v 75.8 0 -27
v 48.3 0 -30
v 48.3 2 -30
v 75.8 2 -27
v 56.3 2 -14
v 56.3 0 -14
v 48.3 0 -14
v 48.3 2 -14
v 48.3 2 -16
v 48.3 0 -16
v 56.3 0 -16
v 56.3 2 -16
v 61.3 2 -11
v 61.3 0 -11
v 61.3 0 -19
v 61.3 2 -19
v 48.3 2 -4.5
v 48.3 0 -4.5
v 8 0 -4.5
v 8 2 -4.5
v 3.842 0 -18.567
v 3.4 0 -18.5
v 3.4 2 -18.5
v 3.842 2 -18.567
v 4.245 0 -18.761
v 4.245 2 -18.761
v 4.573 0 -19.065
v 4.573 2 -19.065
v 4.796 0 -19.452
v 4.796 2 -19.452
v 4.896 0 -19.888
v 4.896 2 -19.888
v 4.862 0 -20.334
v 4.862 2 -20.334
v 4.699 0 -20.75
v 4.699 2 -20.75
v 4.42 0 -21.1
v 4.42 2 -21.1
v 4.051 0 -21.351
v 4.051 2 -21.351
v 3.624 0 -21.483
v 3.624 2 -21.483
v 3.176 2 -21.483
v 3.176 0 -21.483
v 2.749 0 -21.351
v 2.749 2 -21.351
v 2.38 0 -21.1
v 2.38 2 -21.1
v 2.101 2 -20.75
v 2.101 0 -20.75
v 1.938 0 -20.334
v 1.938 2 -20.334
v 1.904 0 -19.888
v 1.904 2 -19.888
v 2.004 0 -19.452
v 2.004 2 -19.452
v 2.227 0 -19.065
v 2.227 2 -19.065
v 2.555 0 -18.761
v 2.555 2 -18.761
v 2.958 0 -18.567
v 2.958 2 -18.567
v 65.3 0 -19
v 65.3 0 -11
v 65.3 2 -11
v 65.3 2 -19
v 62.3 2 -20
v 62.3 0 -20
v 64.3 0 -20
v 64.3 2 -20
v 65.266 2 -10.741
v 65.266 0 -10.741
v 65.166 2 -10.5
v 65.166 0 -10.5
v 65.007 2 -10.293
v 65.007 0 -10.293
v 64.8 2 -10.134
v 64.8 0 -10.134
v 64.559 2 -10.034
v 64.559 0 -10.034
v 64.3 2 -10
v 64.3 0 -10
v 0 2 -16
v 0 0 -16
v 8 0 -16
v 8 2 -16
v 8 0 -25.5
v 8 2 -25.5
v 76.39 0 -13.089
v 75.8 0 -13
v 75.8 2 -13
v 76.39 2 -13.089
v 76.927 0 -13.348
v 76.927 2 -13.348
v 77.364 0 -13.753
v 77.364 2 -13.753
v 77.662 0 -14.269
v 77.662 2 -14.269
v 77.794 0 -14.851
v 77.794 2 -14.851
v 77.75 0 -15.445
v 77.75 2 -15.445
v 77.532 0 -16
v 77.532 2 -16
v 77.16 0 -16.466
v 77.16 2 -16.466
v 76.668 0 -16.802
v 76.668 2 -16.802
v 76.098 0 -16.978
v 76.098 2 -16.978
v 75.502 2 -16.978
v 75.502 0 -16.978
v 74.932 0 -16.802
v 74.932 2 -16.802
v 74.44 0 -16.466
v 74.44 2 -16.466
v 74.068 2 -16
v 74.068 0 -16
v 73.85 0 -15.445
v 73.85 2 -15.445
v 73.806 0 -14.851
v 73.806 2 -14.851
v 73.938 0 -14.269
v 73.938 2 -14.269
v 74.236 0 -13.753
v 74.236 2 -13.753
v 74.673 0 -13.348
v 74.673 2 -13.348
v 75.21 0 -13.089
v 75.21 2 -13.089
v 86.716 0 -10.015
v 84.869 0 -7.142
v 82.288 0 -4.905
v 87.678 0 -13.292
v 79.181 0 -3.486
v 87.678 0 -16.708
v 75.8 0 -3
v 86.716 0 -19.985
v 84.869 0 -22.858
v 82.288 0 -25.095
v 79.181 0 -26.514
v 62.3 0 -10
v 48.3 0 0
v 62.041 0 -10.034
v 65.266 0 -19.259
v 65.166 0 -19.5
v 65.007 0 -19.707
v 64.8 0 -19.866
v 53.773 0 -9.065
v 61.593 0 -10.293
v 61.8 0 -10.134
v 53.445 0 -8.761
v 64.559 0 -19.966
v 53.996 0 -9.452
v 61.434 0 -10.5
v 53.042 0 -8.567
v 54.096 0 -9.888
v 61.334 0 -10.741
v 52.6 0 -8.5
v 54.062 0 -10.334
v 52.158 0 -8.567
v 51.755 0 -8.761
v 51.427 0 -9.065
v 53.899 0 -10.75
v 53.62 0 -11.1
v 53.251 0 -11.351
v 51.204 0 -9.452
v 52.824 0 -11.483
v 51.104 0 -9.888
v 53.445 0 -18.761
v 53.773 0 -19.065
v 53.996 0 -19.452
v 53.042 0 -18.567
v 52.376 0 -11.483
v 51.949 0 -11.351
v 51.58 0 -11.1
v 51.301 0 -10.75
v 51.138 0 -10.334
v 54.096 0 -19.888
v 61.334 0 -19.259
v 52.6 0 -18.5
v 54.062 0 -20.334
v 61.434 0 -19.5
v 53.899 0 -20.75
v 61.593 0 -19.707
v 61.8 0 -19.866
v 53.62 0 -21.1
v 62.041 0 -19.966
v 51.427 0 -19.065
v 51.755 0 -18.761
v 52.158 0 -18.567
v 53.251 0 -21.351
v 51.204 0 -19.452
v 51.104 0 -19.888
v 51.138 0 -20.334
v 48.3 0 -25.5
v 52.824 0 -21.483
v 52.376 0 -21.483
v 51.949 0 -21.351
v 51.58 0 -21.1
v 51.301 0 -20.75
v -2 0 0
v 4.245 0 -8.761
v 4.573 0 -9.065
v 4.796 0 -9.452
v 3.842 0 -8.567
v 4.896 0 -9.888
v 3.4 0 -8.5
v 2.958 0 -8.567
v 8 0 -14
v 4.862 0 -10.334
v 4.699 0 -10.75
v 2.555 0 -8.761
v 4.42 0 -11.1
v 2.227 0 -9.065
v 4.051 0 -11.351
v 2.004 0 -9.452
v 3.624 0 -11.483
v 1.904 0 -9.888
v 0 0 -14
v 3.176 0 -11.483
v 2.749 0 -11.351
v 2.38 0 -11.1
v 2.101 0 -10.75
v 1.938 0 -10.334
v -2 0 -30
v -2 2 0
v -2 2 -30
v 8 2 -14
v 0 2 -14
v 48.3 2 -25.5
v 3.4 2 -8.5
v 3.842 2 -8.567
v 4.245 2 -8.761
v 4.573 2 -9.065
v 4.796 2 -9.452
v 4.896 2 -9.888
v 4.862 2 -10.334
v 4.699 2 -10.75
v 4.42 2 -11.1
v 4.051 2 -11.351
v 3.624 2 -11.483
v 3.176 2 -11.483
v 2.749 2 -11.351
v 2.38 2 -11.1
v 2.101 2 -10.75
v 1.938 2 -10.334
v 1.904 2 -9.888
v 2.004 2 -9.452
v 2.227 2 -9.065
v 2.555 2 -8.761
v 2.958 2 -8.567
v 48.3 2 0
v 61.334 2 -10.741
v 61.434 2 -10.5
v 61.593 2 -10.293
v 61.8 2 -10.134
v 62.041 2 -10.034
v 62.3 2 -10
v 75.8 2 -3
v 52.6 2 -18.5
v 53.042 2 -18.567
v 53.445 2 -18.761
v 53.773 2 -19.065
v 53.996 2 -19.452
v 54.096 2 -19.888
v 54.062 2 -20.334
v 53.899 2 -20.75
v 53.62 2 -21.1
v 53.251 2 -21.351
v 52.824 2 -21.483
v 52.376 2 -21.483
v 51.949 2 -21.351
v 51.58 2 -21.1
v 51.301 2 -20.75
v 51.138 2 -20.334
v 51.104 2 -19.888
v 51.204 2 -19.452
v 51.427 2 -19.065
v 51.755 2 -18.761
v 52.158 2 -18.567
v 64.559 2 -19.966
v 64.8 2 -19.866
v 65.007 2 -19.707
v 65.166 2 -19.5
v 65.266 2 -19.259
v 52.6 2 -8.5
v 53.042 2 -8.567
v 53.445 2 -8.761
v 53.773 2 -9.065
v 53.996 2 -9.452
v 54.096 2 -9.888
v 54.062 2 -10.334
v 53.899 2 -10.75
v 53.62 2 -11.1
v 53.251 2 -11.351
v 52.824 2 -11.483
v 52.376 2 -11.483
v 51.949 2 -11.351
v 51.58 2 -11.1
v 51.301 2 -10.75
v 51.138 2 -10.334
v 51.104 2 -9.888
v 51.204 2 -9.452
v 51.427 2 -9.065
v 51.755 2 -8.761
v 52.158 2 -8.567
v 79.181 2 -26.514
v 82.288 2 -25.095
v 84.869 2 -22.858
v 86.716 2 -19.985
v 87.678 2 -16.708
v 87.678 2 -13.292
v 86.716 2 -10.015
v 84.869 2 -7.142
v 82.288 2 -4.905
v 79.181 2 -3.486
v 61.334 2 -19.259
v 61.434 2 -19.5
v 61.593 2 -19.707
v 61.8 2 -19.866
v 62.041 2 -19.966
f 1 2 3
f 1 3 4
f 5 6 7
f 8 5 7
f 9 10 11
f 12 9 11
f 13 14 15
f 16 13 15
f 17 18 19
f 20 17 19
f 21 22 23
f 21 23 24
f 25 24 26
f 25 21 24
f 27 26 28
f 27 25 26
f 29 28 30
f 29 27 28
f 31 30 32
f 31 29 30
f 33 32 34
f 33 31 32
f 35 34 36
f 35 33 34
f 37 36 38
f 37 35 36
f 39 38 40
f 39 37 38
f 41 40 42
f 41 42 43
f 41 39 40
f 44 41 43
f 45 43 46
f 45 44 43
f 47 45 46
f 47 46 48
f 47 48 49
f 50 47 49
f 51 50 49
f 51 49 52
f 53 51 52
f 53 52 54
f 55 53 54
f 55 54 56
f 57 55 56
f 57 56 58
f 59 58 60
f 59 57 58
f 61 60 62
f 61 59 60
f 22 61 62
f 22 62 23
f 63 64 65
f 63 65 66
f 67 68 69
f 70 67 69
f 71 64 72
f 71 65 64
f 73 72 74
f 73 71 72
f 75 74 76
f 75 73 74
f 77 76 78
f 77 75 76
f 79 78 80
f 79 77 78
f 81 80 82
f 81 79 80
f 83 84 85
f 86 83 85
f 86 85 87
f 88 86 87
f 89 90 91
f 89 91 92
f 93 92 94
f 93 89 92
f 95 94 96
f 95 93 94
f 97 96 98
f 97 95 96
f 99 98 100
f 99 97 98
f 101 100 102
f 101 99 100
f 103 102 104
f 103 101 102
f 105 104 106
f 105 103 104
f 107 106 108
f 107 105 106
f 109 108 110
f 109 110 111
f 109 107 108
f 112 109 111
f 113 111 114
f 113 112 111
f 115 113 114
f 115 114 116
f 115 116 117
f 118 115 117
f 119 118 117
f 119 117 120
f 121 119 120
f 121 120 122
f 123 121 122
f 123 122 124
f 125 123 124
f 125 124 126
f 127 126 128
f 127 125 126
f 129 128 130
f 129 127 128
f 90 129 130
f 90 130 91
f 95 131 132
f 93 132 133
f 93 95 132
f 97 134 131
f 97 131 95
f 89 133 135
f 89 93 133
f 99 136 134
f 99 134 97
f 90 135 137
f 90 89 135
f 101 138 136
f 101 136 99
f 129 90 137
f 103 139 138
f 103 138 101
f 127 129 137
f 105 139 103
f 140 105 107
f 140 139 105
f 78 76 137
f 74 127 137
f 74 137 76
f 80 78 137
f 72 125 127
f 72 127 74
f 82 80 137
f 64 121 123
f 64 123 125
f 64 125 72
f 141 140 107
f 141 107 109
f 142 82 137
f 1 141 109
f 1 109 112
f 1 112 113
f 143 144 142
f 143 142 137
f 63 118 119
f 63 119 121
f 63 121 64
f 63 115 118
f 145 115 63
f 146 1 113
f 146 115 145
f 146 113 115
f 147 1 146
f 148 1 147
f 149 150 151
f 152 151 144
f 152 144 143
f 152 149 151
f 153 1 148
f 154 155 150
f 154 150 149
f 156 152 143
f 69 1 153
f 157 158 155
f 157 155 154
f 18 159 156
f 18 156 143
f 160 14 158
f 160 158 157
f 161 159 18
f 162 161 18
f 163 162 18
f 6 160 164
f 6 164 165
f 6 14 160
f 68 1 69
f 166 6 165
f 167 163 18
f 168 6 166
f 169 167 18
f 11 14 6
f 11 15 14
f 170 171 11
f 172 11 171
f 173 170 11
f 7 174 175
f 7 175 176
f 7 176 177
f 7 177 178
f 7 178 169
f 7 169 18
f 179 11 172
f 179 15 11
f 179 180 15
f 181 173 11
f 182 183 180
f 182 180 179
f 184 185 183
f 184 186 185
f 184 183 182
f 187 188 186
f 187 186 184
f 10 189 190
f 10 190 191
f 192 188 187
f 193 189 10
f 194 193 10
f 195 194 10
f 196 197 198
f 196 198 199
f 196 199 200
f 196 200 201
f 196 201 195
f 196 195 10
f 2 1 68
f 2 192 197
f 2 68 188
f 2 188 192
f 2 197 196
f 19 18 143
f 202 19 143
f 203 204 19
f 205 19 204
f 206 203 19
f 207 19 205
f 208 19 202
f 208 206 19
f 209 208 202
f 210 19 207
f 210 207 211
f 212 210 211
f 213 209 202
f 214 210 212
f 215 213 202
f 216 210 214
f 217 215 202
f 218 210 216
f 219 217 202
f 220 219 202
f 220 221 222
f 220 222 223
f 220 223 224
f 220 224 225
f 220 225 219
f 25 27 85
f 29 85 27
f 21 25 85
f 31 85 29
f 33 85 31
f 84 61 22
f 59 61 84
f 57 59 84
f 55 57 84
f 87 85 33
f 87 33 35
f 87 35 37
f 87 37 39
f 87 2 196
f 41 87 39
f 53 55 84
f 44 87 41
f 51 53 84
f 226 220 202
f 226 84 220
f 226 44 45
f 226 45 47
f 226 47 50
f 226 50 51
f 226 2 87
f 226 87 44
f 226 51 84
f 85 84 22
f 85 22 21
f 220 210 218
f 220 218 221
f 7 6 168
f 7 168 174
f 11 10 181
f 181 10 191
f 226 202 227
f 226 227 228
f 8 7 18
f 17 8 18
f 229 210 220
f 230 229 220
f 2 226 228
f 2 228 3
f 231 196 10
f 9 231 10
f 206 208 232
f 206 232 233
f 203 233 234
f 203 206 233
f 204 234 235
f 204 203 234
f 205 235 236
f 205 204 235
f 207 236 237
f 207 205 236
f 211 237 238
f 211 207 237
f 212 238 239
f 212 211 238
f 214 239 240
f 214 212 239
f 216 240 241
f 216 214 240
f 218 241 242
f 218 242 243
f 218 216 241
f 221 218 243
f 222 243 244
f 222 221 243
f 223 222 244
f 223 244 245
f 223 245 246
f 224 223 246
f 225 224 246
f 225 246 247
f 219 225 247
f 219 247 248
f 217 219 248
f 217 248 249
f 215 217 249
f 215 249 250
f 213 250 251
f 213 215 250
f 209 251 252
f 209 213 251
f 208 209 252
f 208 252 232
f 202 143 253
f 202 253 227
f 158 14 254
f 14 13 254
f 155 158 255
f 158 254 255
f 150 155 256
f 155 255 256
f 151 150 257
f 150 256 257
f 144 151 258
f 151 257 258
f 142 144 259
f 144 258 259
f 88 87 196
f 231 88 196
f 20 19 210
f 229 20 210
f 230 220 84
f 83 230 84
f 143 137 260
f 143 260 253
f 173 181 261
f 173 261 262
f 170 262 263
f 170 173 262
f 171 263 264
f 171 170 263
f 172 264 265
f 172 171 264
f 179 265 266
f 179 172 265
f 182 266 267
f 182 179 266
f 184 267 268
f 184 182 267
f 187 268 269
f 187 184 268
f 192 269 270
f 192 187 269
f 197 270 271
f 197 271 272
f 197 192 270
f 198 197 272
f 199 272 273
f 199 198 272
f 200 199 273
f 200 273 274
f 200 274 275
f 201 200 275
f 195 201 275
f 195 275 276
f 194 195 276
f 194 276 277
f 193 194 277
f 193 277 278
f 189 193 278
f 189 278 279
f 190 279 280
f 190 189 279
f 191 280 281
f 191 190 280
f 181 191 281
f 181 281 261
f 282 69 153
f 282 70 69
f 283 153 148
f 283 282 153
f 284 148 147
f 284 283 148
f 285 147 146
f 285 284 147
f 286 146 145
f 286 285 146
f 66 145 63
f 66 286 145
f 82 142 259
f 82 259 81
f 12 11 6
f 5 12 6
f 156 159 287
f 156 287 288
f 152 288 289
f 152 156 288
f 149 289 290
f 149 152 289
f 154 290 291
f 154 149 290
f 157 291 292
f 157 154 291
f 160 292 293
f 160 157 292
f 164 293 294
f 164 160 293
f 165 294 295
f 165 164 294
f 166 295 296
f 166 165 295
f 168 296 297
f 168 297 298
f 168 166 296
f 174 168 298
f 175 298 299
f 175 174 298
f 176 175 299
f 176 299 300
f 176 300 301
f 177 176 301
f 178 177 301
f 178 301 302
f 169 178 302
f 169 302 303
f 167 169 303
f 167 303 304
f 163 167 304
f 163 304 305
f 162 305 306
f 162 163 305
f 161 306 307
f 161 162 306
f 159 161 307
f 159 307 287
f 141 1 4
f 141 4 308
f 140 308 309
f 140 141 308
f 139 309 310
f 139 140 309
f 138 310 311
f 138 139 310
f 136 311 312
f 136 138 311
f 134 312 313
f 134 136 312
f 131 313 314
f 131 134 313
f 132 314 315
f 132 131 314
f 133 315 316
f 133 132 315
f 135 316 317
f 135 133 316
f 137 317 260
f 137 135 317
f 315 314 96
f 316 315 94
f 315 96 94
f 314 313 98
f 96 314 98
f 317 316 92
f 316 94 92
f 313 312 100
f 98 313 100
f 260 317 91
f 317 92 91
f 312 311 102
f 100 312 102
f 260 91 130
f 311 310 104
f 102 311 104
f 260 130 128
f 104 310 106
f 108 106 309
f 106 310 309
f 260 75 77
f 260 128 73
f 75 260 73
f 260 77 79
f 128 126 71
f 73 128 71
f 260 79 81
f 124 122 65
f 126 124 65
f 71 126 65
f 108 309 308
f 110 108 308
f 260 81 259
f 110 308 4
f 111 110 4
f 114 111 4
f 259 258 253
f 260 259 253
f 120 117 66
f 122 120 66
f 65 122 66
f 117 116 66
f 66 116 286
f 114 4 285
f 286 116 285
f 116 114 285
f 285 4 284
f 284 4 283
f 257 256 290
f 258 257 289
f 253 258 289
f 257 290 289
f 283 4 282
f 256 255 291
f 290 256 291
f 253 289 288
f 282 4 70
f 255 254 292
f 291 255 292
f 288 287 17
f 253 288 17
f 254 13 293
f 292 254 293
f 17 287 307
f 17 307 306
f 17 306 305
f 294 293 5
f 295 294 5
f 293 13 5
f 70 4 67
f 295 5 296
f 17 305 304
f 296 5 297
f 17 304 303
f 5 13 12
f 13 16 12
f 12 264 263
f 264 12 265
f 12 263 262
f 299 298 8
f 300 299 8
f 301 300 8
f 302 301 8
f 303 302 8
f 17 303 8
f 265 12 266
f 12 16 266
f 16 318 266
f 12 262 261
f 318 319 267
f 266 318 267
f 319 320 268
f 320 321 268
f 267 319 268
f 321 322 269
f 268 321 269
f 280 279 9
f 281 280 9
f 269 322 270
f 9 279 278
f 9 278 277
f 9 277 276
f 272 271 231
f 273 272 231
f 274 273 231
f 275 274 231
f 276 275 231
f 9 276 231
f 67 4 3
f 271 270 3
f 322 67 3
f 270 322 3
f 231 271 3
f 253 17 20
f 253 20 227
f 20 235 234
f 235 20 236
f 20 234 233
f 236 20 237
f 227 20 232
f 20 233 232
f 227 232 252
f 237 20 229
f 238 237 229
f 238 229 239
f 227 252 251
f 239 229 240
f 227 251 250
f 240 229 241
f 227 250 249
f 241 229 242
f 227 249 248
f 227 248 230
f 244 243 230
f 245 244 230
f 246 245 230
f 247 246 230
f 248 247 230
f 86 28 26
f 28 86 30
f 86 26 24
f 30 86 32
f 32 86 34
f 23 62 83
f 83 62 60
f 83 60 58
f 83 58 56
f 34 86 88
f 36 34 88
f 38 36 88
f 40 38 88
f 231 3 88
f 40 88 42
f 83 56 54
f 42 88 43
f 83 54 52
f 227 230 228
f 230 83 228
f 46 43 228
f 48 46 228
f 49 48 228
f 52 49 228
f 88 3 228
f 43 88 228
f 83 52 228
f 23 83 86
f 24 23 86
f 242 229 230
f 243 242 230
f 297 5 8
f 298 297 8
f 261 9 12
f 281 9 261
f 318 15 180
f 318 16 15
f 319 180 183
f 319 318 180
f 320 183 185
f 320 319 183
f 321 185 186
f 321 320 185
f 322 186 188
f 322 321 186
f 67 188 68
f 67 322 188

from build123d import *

# Parameters (mm, degrees)
SKETCH_1_R      = 1.5
SKETCH_1_R_2    = 2
SKETCH_1_W      = 4
SKETCH_1_H      = 10
EXTRUDE_1_DEPTH = 2
FILLET_1_R      = 1


with BuildPart() as part:
    # Эскиз1 → Бобышка-Вытянуть1 (new body)
    with BuildSketch(Plane(origin=(0, 0, 0), x_dir=(1, 0, 0), z_dir=(0, 1, 0))):
        with BuildLine():
            Line((-2, 30), (48.3, 30))
            Line((48.3, 30), (75.8, 27))
            ThreePointArc((75.8, 27), (87.8, 15), (75.8, 3))
            Line((75.8, 3), (48.3, 0))
            Line((48.3, 0), (-2, 0))
            Line((-2, 0), (-2, 30))
        make_face()
        with Locations(Location((3.4, 10, 0), (0, 0, 270))):
            Circle(SKETCH_1_R, mode=Mode.SUBTRACT)
        with Locations(Location((3.4, 20, 0), (0, 0, 270))):
            Circle(SKETCH_1_R, mode=Mode.SUBTRACT)
        with Locations(Location((52.6, 10, 0), (0, 0, 270))):
            Circle(SKETCH_1_R, mode=Mode.SUBTRACT)
        with Locations(Location((52.6, 20, 0), (0, 0, 270))):
            Circle(SKETCH_1_R, mode=Mode.SUBTRACT)
        with Locations(Location((75.8, 15, 0), (0, 0, 270))):
            Circle(SKETCH_1_R_2, mode=Mode.SUBTRACT)
        Polygon((8, 25.5), (48.3, 25.5), (48.3, 16), (56.3, 16), (56.3, 14), (48.3, 14), (48.3, 4.5), (8, 4.5), (8, 14), (0, 14), (0, 16), (8, 16), align=None, mode=Mode.SUBTRACT)
        with Locations((63.3, 15)):
            Rectangle(SKETCH_1_W, SKETCH_1_H, mode=Mode.SUBTRACT)
    extrude(amount=EXTRUDE_1_DEPTH)

    # Скругление1
    fillet_1_edges = [part.edges().sort_by_distance(p)[0] for p in [
        (65.3, 1, -10),
        (65.3, 1, -20),
        (61.3, 1, -20),
        (61.3, 1, -10),
    ]]
    fillet(fillet_1_edges, radius=FILLET_1_R)


solid = part.part
